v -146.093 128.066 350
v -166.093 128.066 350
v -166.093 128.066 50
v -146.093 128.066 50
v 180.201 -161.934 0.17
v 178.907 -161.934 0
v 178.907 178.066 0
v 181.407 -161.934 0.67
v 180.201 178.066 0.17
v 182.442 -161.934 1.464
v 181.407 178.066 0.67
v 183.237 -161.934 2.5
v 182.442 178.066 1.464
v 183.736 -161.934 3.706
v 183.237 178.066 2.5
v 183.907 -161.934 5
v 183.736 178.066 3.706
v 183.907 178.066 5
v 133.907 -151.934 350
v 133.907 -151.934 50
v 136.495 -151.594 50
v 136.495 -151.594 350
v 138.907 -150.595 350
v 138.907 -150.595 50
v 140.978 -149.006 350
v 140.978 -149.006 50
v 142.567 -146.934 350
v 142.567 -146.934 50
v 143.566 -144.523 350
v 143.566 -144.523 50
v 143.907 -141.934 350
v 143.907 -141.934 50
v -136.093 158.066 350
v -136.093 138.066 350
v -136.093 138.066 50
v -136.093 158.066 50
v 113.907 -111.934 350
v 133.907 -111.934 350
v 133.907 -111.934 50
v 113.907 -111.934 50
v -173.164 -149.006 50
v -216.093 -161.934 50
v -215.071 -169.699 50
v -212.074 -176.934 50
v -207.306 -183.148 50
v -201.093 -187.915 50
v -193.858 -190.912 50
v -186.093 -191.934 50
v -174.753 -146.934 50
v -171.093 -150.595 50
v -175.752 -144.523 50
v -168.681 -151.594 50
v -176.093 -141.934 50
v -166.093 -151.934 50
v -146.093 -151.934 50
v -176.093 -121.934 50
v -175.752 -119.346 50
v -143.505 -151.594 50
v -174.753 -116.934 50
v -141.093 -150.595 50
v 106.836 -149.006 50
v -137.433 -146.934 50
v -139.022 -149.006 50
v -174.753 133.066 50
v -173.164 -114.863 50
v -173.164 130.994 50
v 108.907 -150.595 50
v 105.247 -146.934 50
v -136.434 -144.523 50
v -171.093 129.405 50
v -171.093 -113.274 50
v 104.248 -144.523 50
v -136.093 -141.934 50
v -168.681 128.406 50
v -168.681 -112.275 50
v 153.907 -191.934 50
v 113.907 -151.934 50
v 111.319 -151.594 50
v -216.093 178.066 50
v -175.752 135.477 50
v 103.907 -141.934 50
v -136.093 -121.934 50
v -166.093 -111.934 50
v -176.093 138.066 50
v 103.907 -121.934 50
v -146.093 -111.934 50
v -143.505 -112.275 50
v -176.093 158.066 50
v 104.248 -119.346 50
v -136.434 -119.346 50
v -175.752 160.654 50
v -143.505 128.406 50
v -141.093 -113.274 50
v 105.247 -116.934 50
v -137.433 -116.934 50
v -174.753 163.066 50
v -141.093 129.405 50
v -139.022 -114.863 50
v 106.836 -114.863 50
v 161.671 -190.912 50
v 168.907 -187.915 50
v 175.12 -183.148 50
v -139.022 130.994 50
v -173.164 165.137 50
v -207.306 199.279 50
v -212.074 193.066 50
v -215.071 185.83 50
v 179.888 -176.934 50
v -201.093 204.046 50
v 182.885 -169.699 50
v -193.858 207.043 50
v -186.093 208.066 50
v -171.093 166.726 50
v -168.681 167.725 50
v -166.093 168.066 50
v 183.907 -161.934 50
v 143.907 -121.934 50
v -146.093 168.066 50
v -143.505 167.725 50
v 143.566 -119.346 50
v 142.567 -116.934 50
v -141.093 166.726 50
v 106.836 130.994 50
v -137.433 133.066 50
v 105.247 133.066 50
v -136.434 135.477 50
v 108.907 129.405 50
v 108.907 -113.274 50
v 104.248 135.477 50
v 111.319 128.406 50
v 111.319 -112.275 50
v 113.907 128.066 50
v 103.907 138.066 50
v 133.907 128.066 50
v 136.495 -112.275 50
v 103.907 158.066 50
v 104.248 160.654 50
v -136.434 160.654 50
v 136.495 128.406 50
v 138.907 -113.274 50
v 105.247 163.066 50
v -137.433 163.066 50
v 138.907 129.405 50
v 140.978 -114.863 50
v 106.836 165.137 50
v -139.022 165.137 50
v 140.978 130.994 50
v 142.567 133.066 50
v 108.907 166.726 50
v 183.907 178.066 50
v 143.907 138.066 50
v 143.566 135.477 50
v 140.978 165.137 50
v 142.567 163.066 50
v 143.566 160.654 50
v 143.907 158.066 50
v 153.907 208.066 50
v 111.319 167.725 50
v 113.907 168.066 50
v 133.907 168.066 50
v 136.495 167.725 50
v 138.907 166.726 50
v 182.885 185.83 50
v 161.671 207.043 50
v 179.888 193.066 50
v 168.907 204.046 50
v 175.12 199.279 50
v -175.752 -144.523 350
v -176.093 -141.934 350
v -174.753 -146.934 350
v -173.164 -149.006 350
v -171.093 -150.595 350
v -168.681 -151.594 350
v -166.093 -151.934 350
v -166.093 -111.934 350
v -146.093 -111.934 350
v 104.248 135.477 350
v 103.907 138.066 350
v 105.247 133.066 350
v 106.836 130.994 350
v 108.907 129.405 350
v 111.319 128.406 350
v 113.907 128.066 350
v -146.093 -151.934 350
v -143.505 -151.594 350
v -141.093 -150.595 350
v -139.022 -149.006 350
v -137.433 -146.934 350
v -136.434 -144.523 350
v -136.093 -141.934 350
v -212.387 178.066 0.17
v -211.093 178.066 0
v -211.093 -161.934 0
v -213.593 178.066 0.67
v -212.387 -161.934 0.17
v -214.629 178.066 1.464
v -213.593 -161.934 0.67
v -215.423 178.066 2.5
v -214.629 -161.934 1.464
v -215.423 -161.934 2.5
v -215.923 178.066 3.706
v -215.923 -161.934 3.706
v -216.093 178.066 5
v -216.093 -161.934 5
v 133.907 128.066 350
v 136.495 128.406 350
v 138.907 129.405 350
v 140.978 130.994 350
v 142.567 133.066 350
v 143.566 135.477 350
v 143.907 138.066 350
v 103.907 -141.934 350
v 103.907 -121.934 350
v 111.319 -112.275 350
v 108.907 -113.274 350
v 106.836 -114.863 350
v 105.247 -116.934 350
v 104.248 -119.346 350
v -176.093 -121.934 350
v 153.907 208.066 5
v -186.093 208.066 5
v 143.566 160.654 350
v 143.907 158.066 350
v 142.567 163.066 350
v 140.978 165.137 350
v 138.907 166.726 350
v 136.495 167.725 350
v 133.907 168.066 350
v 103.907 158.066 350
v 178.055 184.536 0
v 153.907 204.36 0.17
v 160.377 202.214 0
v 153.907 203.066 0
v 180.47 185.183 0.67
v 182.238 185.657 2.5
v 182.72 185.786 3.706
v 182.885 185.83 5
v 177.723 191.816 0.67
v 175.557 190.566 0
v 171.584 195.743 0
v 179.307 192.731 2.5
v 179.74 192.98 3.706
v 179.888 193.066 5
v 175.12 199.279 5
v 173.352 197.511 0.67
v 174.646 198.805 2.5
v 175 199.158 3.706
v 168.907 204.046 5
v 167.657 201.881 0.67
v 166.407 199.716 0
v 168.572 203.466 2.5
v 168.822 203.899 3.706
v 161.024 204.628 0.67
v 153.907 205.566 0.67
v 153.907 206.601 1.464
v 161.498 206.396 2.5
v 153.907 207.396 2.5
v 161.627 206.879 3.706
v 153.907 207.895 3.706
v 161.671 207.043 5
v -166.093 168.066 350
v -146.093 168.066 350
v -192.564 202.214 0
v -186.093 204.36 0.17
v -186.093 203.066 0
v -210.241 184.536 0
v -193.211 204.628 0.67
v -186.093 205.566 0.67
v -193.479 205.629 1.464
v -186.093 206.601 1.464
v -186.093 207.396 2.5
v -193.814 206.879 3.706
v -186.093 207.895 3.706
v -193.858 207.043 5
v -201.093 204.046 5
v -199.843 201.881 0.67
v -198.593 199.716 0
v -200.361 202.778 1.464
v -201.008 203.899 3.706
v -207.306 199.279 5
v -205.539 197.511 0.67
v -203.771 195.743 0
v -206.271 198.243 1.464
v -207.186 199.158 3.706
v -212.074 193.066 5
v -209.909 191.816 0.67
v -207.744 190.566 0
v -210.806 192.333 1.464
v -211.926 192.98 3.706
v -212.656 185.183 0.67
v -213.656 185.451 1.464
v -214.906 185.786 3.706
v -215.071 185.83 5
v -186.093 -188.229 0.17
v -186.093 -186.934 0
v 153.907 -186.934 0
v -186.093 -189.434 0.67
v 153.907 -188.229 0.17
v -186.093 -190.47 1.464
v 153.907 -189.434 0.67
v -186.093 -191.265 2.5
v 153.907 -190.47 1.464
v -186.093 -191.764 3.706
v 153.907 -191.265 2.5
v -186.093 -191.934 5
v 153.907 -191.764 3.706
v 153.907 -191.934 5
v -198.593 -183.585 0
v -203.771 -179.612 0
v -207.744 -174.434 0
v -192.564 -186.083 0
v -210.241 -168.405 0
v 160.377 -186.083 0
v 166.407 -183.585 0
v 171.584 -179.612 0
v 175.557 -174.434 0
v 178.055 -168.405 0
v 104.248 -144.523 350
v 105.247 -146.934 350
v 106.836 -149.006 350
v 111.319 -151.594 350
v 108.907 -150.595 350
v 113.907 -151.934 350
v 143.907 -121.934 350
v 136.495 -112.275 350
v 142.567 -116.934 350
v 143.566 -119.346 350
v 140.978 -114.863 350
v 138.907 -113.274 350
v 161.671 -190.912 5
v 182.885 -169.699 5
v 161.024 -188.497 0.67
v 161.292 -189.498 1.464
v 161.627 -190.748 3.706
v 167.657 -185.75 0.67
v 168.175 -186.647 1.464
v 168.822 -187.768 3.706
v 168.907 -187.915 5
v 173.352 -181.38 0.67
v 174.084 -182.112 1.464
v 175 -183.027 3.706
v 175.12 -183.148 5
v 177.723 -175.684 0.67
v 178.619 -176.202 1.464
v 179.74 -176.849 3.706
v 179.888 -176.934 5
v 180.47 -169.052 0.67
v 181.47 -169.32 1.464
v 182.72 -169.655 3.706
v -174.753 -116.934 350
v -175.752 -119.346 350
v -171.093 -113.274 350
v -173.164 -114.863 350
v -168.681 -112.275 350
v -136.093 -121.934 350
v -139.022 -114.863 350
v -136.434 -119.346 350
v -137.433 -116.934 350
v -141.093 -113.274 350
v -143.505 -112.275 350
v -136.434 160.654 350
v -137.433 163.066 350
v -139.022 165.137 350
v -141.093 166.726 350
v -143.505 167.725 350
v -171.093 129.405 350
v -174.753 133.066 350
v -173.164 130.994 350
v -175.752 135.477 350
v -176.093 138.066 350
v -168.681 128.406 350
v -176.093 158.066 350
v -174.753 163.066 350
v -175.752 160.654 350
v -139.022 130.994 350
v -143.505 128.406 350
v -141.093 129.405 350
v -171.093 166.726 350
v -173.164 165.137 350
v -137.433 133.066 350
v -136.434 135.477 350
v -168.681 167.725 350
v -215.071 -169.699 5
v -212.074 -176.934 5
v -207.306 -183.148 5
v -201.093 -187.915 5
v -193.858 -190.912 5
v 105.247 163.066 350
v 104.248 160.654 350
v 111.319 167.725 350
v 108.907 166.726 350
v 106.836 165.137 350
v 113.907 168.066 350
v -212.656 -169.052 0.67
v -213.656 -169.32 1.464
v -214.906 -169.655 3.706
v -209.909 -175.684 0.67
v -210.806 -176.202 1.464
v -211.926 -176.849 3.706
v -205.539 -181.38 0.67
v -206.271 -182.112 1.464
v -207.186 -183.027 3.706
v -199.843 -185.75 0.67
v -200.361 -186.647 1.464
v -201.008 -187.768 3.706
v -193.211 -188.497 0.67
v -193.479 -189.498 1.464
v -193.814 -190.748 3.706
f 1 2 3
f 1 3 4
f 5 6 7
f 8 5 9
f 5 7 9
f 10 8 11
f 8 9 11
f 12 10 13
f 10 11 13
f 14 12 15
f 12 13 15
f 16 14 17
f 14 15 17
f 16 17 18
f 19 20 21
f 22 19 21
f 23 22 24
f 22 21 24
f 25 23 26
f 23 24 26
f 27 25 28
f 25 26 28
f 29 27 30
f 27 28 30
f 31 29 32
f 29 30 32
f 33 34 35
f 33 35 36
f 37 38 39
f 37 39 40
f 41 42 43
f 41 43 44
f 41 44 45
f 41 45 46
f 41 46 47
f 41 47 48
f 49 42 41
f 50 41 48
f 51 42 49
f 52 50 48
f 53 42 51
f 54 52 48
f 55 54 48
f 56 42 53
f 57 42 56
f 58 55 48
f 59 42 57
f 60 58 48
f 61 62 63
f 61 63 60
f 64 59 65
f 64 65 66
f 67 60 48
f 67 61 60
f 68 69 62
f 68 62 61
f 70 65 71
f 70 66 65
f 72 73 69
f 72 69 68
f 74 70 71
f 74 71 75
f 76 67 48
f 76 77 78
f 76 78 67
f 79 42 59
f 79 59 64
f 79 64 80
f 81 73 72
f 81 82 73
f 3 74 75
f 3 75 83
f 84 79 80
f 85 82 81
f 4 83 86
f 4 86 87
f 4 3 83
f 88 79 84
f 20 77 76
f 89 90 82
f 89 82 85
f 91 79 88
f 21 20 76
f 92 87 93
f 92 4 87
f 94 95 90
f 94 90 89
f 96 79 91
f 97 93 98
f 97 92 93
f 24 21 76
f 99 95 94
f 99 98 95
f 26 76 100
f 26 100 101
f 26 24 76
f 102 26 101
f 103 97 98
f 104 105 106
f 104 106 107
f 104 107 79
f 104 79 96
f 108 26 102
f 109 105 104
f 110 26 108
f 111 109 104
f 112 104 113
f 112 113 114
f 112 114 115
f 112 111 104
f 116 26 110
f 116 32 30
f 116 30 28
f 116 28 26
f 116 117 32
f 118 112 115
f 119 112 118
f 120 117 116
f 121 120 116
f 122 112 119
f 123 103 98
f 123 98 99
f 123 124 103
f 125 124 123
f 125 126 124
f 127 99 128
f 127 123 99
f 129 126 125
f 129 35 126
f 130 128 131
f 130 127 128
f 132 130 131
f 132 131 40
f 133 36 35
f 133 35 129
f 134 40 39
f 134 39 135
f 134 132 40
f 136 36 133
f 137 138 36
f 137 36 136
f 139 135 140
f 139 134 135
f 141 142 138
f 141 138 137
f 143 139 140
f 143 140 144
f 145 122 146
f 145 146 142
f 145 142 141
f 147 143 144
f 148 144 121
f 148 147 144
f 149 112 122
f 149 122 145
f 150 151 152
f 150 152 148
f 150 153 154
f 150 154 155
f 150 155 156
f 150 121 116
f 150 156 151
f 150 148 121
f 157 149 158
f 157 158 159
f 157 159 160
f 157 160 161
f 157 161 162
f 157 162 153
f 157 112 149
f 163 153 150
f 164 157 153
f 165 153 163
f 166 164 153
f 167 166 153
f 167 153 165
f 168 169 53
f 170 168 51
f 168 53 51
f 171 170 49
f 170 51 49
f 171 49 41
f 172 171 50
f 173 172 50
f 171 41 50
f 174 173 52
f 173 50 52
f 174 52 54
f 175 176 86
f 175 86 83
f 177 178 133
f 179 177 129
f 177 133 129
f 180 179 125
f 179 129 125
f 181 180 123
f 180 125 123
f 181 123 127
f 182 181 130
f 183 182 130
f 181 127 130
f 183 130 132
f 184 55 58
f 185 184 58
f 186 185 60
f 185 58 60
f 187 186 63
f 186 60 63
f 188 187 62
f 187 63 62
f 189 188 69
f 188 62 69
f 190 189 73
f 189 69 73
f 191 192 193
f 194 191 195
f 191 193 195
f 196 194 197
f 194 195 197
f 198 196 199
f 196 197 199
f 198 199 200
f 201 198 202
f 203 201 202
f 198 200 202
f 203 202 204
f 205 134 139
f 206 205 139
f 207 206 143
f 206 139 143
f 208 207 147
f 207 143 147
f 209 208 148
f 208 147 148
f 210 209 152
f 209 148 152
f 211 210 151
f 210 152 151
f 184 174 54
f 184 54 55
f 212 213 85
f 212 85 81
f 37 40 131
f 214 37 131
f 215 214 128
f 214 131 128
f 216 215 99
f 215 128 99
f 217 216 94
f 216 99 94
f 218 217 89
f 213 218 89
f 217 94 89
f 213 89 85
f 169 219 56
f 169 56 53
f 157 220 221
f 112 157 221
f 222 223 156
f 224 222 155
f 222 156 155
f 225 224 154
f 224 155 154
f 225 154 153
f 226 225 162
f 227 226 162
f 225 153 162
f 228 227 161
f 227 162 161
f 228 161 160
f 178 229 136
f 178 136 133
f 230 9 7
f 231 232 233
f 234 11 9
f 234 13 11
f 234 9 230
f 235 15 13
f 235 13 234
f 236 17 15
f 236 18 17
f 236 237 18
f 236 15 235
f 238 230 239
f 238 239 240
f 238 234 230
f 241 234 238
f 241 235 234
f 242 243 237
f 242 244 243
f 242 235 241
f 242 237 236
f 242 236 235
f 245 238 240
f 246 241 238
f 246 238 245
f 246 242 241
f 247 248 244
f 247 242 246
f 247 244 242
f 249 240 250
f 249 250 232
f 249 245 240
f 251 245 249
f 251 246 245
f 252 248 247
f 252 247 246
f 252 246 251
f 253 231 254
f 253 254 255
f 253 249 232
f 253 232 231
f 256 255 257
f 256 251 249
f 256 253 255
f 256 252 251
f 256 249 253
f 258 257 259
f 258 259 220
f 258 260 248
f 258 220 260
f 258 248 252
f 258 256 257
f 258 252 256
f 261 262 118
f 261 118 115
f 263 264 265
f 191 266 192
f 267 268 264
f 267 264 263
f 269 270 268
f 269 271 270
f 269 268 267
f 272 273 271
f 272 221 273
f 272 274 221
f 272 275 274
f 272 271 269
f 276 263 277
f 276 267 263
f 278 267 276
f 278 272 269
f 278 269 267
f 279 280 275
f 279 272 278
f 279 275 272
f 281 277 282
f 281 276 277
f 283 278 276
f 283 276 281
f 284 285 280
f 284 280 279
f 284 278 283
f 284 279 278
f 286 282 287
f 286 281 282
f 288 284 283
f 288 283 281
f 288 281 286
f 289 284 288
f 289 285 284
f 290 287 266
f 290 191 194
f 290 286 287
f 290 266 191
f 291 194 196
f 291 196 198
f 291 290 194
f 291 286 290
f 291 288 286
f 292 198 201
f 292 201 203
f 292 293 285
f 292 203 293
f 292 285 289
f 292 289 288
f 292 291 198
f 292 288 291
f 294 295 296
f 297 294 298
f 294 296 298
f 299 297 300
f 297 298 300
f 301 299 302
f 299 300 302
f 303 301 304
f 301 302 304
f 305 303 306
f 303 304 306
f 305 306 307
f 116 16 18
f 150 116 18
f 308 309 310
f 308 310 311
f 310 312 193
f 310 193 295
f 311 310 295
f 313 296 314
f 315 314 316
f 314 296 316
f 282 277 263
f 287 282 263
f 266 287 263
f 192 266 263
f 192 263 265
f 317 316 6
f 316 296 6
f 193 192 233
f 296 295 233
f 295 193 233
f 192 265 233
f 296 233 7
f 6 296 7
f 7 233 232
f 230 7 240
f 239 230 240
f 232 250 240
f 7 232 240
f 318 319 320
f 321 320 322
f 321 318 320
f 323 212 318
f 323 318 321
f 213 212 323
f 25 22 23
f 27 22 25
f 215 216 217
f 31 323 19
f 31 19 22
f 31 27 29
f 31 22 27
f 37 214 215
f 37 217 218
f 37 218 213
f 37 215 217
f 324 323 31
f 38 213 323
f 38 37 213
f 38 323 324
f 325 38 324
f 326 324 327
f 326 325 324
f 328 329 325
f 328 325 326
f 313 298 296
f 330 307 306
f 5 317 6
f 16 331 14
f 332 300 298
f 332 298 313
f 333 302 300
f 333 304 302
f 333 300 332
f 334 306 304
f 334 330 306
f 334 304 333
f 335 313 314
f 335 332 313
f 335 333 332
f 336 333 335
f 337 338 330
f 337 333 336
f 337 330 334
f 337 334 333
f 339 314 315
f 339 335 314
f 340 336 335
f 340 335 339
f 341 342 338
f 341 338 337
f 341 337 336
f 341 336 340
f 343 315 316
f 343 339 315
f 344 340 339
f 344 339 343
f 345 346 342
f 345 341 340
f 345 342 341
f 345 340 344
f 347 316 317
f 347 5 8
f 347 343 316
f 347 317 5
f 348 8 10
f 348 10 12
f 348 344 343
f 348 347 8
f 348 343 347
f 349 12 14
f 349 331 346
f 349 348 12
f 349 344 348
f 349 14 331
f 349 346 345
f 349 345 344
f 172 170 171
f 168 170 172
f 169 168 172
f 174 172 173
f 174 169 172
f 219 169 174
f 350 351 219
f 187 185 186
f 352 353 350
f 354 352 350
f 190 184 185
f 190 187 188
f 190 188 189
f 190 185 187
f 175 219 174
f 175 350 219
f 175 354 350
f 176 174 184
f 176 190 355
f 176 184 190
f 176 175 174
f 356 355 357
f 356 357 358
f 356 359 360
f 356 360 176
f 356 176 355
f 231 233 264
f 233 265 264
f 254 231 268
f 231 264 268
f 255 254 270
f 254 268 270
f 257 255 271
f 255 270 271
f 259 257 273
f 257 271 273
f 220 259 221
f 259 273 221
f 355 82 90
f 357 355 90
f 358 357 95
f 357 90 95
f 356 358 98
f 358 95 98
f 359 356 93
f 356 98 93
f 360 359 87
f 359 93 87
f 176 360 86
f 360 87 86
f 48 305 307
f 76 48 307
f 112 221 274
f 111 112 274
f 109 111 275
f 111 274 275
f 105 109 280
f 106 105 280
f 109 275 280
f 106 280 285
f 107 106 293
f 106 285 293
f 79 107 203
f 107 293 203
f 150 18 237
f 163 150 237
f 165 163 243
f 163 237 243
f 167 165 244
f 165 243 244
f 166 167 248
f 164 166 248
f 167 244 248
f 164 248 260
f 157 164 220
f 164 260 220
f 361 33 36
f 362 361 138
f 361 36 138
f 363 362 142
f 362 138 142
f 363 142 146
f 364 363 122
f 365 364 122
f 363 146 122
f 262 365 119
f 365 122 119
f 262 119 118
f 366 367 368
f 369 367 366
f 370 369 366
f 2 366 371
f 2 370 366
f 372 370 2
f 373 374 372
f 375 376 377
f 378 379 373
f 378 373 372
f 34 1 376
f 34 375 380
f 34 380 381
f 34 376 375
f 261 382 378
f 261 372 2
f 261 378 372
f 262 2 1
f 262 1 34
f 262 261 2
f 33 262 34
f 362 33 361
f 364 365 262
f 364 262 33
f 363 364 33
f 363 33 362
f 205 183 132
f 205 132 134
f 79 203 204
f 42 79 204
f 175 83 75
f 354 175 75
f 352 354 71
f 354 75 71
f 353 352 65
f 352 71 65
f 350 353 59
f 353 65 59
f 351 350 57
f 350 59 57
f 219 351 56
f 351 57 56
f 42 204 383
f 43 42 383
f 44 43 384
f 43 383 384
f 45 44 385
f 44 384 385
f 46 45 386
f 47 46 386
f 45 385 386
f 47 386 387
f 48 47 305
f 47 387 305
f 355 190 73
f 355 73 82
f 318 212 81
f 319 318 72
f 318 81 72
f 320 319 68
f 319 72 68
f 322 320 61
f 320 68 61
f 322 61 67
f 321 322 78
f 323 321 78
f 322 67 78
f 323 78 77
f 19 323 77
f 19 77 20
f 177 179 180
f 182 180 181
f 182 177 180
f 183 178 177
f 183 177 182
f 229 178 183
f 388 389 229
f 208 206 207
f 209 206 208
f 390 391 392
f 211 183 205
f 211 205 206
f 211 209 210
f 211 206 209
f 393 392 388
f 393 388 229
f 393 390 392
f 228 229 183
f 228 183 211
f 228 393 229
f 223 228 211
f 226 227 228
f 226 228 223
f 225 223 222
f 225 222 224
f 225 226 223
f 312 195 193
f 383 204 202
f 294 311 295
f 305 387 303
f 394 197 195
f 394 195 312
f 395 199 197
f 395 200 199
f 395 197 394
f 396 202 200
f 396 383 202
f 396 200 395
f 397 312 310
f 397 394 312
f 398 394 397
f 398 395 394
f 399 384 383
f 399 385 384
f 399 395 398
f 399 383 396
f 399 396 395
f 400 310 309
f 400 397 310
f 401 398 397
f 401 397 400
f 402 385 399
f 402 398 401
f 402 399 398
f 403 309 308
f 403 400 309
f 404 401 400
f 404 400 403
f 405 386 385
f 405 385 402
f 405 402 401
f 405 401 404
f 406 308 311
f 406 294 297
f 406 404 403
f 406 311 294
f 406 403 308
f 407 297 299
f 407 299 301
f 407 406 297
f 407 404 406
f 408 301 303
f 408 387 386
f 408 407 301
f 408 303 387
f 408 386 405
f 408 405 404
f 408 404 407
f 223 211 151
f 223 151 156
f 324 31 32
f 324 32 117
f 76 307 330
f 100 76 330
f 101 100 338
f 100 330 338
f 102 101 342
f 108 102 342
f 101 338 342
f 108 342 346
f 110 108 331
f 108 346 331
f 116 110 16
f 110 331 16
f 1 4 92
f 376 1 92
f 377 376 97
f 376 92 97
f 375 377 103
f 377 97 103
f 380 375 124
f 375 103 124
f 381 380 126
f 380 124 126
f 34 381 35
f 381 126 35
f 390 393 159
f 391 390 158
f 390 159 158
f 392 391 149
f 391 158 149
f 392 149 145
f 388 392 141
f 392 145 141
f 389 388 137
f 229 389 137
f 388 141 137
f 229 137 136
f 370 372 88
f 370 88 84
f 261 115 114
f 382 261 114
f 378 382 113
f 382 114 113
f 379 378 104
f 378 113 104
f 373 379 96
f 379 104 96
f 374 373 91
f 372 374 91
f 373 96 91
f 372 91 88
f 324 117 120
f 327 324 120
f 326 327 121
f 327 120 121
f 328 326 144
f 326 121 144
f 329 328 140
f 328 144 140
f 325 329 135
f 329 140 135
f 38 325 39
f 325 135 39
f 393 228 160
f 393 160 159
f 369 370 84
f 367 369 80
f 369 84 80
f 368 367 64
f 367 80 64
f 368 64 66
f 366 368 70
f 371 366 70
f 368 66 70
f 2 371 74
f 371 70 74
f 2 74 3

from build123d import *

# Parameters (mm, degrees)
F1_DEPTH = 50
F3_DEPTH = 350
F4_R     = 5


with BuildPart() as f1:
    # F0 (on Top) → F1 (new body)
    with BuildSketch(Plane.XY):
        with BuildLine():
            Line((153.906826, 208.065538), (-186.093174, 208.065538))
            ThreePointArc((-186.093174, 208.065538), (-207.306378, 199.278742), (-216.093174, 178.065538))
            Line((-216.093174, 178.065538), (-216.093174, -161.934462))
            ThreePointArc((-216.093174, -161.934462), (-207.306378, -183.147665), (-186.093174, -191.934462))
            Line((-186.093174, -191.934462), (153.906826, -191.934462))
            ThreePointArc((153.906826, -191.934462), (175.120029, -183.147665), (183.906826, -161.934462))
            Line((183.906826, -161.934462), (183.906826, 178.065538))
            ThreePointArc((183.906826, 178.065538), (175.120029, 199.278742), (153.906826, 208.065538))
        make_face()
    extrude(amount=F1_DEPTH)

    # F2 (on Top) → F3 (join)
    with BuildSketch(Plane.XY):
        with BuildLine():
            Line((113.906826, -151.934462), (133.906826, -151.934462))
            ThreePointArc((133.906826, -151.934462), (140.977893, -149.005529), (143.906826, -141.934462))
            Line((143.906826, -141.934462), (143.906826, -121.934462))
            ThreePointArc((143.906826, -121.934462), (140.977893, -114.863394), (133.906826, -111.934462))
            Line((133.906826, -111.934462), (113.906826, -111.934462))
            ThreePointArc((113.906826, -111.934462), (106.835758, -114.863394), (103.906826, -121.934462))
            Line((103.906826, -121.934462), (103.906826, -141.934462))
            ThreePointArc((103.906826, -141.934462), (106.835758, -149.005529), (113.906826, -151.934462))
        make_face()
        with BuildLine():
            Line((113.906826, 128.065538), (133.906826, 128.065538))
            ThreePointArc((133.906826, 128.065538), (140.977893, 130.994471), (143.906826, 138.065538))
            Line((143.906826, 138.065538), (143.906826, 158.065538))
            ThreePointArc((143.906826, 158.065538), (140.977893, 165.136606), (133.906826, 168.065538))
            Line((133.906826, 168.065538), (113.906826, 168.065538))
            ThreePointArc((113.906826, 168.065538), (106.835758, 165.136606), (103.906826, 158.065538))
            Line((103.906826, 158.065538), (103.906826, 138.065538))
            ThreePointArc((103.906826, 138.065538), (106.835758, 130.994471), (113.906826, 128.065538))
        make_face()
        with BuildLine():
            Line((-166.093174, 128.065538), (-146.093174, 128.065538))
            ThreePointArc((-146.093174, 128.065538), (-139.022107, 130.994471), (-136.093174, 138.065538))
            Line((-136.093174, 138.065538), (-136.093174, 158.065538))
            ThreePointArc((-136.093174, 158.065538), (-139.022107, 165.136606), (-146.093174, 168.065538))
            Line((-146.093174, 168.065538), (-166.093174, 168.065538))
            ThreePointArc((-166.093174, 168.065538), (-173.164242, 165.136606), (-176.093174, 158.065538))
            Line((-176.093174, 158.065538), (-176.093174, 138.065538))
            ThreePointArc((-176.093174, 138.065538), (-173.164242, 130.994471), (-166.093174, 128.065538))
        make_face()
        with BuildLine():
            Line((-166.093174, -151.934462), (-146.093174, -151.934462))
            ThreePointArc((-146.093174, -151.934462), (-139.022107, -149.005529), (-136.093174, -141.934462))
            Line((-136.093174, -141.934462), (-136.093174, -121.934462))
            ThreePointArc((-136.093174, -121.934462), (-139.022107, -114.863394), (-146.093174, -111.934462))
            Line((-146.093174, -111.934462), (-166.093174, -111.934462))
            ThreePointArc((-166.093174, -111.934462), (-173.164242, -114.863394), (-176.093174, -121.934462))
            Line((-176.093174, -121.934462), (-176.093174, -141.934462))
            ThreePointArc((-176.093174, -141.934462), (-173.164242, -149.005529), (-166.093174, -151.934462))
        make_face()
    extrude(amount=F3_DEPTH)

    # F4
    f4_edges = [f1.edges().sort_by_distance(p)[0] for p in [
        (-16.093174, 208.065538, 0),
    ]]
    fillet(f4_edges, radius=F4_R)


solid = f1.part
